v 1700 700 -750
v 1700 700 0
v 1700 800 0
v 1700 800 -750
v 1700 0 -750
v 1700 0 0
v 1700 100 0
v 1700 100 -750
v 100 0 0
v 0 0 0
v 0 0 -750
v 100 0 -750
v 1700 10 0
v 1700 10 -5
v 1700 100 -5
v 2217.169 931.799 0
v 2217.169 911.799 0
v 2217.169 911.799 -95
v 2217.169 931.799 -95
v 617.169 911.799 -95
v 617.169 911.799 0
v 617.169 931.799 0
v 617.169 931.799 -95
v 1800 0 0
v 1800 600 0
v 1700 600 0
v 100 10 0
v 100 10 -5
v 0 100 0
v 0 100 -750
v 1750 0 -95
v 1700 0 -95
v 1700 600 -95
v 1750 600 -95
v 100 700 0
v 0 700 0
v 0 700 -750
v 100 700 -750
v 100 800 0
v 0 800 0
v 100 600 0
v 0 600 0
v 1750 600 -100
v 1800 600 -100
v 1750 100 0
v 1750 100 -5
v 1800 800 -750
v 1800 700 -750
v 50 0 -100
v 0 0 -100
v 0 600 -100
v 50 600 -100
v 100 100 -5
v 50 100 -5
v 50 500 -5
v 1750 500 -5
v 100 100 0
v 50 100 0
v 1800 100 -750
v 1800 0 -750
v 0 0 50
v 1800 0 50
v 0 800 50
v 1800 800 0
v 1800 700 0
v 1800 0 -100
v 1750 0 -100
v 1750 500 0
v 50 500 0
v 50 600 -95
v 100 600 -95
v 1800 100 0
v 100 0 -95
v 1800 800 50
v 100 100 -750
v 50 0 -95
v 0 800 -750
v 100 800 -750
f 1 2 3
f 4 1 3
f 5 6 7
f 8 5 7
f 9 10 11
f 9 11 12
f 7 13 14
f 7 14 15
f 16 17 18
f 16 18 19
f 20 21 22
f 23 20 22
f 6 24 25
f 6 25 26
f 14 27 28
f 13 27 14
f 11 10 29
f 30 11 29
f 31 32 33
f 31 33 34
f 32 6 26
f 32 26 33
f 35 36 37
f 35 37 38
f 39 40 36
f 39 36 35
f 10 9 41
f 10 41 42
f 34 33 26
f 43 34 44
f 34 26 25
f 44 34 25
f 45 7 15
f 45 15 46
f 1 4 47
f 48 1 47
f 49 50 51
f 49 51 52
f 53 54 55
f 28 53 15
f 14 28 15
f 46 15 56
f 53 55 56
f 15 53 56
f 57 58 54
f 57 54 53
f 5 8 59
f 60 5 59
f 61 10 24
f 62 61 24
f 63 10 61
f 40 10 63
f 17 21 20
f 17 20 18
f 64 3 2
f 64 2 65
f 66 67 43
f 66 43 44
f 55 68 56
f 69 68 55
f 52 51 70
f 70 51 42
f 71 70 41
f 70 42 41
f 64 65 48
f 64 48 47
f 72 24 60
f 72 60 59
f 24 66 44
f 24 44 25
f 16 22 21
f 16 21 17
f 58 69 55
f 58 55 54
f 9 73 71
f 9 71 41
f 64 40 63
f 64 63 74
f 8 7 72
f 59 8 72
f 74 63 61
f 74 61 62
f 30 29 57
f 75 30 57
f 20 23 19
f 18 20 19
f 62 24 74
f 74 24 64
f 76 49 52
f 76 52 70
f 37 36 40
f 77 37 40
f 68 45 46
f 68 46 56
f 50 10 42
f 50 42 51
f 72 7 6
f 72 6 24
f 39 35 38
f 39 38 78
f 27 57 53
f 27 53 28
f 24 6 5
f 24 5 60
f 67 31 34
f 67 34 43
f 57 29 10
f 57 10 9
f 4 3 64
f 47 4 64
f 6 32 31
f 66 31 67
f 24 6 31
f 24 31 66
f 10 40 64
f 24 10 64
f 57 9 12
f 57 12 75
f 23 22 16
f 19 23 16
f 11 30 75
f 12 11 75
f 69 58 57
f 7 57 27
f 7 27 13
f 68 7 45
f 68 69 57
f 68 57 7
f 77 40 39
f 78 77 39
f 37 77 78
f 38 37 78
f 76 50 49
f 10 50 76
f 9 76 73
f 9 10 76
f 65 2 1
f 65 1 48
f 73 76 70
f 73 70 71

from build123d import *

# Parameters (mm, degrees)
F0_W     = 1800
F0_H     = 800
F1_DEPTH = 50
F2_W     = 100
F2_H     = 100
F3_DEPTH = 750
F5_DEPTH = 600
F7_DEPTH = 5
F8_W     = 1600
F8_H     = 20
F9_DEPTH = 95


with BuildPart() as f1:
    # F0 (on Top) → F1 (new body)
    with BuildSketch(Plane.XY):
        with Locations((900, 400)):
            Rectangle(F0_W, F0_H)
    extrude(amount=F1_DEPTH)


with BuildPart() as f3:
    # F2 (on Top) → F3 (new body)
    with BuildSketch(Plane.XY):
        with Locations((50, 50)):
            Rectangle(F2_W, F2_H)
        with Locations((1750, 50)):
            Rectangle(F2_W, F2_H)
        with Locations((1750, 750)):
            Rectangle(F2_W, F2_H)
        with Locations((50, 750)):
            Rectangle(F2_W, F2_H)
    extrude(amount=-F3_DEPTH)


with BuildPart() as f5:
    # F4 (on Front) → F5 (new body)
    with BuildSketch(Plane.XZ):
        Polygon((100, 0), (0, 0), (0, -100), (50, -100), (50, -95), (100, -95), align=None)
        Polygon((1750, -95), (1750, -100), (1800, -100), (1800, 0), (1700, 0), (1700, -95), align=None)
    extrude(amount=-F5_DEPTH)


with BuildPart() as f7:
    # F6 (on Top) → F7 (new body)
    with BuildSketch(Plane.XY):
        Polygon((100, 100), (100, 10), (1700, 10), (1700, 100), (1750, 100), (1750, 500), (50, 500), (50, 100), align=None)
    extrude(amount=-F7_DEPTH)


with BuildPart() as f9:
    # F8 (on Top) → F9 (new body)
    with BuildSketch(Plane.XY):
        with Locations((1417.168561, 921.799362)):
            Rectangle(F8_W, F8_H)
    extrude(amount=-F9_DEPTH)


solid = Compound([f1.part, f3.part, f5.part, f7.part, f9.part])
